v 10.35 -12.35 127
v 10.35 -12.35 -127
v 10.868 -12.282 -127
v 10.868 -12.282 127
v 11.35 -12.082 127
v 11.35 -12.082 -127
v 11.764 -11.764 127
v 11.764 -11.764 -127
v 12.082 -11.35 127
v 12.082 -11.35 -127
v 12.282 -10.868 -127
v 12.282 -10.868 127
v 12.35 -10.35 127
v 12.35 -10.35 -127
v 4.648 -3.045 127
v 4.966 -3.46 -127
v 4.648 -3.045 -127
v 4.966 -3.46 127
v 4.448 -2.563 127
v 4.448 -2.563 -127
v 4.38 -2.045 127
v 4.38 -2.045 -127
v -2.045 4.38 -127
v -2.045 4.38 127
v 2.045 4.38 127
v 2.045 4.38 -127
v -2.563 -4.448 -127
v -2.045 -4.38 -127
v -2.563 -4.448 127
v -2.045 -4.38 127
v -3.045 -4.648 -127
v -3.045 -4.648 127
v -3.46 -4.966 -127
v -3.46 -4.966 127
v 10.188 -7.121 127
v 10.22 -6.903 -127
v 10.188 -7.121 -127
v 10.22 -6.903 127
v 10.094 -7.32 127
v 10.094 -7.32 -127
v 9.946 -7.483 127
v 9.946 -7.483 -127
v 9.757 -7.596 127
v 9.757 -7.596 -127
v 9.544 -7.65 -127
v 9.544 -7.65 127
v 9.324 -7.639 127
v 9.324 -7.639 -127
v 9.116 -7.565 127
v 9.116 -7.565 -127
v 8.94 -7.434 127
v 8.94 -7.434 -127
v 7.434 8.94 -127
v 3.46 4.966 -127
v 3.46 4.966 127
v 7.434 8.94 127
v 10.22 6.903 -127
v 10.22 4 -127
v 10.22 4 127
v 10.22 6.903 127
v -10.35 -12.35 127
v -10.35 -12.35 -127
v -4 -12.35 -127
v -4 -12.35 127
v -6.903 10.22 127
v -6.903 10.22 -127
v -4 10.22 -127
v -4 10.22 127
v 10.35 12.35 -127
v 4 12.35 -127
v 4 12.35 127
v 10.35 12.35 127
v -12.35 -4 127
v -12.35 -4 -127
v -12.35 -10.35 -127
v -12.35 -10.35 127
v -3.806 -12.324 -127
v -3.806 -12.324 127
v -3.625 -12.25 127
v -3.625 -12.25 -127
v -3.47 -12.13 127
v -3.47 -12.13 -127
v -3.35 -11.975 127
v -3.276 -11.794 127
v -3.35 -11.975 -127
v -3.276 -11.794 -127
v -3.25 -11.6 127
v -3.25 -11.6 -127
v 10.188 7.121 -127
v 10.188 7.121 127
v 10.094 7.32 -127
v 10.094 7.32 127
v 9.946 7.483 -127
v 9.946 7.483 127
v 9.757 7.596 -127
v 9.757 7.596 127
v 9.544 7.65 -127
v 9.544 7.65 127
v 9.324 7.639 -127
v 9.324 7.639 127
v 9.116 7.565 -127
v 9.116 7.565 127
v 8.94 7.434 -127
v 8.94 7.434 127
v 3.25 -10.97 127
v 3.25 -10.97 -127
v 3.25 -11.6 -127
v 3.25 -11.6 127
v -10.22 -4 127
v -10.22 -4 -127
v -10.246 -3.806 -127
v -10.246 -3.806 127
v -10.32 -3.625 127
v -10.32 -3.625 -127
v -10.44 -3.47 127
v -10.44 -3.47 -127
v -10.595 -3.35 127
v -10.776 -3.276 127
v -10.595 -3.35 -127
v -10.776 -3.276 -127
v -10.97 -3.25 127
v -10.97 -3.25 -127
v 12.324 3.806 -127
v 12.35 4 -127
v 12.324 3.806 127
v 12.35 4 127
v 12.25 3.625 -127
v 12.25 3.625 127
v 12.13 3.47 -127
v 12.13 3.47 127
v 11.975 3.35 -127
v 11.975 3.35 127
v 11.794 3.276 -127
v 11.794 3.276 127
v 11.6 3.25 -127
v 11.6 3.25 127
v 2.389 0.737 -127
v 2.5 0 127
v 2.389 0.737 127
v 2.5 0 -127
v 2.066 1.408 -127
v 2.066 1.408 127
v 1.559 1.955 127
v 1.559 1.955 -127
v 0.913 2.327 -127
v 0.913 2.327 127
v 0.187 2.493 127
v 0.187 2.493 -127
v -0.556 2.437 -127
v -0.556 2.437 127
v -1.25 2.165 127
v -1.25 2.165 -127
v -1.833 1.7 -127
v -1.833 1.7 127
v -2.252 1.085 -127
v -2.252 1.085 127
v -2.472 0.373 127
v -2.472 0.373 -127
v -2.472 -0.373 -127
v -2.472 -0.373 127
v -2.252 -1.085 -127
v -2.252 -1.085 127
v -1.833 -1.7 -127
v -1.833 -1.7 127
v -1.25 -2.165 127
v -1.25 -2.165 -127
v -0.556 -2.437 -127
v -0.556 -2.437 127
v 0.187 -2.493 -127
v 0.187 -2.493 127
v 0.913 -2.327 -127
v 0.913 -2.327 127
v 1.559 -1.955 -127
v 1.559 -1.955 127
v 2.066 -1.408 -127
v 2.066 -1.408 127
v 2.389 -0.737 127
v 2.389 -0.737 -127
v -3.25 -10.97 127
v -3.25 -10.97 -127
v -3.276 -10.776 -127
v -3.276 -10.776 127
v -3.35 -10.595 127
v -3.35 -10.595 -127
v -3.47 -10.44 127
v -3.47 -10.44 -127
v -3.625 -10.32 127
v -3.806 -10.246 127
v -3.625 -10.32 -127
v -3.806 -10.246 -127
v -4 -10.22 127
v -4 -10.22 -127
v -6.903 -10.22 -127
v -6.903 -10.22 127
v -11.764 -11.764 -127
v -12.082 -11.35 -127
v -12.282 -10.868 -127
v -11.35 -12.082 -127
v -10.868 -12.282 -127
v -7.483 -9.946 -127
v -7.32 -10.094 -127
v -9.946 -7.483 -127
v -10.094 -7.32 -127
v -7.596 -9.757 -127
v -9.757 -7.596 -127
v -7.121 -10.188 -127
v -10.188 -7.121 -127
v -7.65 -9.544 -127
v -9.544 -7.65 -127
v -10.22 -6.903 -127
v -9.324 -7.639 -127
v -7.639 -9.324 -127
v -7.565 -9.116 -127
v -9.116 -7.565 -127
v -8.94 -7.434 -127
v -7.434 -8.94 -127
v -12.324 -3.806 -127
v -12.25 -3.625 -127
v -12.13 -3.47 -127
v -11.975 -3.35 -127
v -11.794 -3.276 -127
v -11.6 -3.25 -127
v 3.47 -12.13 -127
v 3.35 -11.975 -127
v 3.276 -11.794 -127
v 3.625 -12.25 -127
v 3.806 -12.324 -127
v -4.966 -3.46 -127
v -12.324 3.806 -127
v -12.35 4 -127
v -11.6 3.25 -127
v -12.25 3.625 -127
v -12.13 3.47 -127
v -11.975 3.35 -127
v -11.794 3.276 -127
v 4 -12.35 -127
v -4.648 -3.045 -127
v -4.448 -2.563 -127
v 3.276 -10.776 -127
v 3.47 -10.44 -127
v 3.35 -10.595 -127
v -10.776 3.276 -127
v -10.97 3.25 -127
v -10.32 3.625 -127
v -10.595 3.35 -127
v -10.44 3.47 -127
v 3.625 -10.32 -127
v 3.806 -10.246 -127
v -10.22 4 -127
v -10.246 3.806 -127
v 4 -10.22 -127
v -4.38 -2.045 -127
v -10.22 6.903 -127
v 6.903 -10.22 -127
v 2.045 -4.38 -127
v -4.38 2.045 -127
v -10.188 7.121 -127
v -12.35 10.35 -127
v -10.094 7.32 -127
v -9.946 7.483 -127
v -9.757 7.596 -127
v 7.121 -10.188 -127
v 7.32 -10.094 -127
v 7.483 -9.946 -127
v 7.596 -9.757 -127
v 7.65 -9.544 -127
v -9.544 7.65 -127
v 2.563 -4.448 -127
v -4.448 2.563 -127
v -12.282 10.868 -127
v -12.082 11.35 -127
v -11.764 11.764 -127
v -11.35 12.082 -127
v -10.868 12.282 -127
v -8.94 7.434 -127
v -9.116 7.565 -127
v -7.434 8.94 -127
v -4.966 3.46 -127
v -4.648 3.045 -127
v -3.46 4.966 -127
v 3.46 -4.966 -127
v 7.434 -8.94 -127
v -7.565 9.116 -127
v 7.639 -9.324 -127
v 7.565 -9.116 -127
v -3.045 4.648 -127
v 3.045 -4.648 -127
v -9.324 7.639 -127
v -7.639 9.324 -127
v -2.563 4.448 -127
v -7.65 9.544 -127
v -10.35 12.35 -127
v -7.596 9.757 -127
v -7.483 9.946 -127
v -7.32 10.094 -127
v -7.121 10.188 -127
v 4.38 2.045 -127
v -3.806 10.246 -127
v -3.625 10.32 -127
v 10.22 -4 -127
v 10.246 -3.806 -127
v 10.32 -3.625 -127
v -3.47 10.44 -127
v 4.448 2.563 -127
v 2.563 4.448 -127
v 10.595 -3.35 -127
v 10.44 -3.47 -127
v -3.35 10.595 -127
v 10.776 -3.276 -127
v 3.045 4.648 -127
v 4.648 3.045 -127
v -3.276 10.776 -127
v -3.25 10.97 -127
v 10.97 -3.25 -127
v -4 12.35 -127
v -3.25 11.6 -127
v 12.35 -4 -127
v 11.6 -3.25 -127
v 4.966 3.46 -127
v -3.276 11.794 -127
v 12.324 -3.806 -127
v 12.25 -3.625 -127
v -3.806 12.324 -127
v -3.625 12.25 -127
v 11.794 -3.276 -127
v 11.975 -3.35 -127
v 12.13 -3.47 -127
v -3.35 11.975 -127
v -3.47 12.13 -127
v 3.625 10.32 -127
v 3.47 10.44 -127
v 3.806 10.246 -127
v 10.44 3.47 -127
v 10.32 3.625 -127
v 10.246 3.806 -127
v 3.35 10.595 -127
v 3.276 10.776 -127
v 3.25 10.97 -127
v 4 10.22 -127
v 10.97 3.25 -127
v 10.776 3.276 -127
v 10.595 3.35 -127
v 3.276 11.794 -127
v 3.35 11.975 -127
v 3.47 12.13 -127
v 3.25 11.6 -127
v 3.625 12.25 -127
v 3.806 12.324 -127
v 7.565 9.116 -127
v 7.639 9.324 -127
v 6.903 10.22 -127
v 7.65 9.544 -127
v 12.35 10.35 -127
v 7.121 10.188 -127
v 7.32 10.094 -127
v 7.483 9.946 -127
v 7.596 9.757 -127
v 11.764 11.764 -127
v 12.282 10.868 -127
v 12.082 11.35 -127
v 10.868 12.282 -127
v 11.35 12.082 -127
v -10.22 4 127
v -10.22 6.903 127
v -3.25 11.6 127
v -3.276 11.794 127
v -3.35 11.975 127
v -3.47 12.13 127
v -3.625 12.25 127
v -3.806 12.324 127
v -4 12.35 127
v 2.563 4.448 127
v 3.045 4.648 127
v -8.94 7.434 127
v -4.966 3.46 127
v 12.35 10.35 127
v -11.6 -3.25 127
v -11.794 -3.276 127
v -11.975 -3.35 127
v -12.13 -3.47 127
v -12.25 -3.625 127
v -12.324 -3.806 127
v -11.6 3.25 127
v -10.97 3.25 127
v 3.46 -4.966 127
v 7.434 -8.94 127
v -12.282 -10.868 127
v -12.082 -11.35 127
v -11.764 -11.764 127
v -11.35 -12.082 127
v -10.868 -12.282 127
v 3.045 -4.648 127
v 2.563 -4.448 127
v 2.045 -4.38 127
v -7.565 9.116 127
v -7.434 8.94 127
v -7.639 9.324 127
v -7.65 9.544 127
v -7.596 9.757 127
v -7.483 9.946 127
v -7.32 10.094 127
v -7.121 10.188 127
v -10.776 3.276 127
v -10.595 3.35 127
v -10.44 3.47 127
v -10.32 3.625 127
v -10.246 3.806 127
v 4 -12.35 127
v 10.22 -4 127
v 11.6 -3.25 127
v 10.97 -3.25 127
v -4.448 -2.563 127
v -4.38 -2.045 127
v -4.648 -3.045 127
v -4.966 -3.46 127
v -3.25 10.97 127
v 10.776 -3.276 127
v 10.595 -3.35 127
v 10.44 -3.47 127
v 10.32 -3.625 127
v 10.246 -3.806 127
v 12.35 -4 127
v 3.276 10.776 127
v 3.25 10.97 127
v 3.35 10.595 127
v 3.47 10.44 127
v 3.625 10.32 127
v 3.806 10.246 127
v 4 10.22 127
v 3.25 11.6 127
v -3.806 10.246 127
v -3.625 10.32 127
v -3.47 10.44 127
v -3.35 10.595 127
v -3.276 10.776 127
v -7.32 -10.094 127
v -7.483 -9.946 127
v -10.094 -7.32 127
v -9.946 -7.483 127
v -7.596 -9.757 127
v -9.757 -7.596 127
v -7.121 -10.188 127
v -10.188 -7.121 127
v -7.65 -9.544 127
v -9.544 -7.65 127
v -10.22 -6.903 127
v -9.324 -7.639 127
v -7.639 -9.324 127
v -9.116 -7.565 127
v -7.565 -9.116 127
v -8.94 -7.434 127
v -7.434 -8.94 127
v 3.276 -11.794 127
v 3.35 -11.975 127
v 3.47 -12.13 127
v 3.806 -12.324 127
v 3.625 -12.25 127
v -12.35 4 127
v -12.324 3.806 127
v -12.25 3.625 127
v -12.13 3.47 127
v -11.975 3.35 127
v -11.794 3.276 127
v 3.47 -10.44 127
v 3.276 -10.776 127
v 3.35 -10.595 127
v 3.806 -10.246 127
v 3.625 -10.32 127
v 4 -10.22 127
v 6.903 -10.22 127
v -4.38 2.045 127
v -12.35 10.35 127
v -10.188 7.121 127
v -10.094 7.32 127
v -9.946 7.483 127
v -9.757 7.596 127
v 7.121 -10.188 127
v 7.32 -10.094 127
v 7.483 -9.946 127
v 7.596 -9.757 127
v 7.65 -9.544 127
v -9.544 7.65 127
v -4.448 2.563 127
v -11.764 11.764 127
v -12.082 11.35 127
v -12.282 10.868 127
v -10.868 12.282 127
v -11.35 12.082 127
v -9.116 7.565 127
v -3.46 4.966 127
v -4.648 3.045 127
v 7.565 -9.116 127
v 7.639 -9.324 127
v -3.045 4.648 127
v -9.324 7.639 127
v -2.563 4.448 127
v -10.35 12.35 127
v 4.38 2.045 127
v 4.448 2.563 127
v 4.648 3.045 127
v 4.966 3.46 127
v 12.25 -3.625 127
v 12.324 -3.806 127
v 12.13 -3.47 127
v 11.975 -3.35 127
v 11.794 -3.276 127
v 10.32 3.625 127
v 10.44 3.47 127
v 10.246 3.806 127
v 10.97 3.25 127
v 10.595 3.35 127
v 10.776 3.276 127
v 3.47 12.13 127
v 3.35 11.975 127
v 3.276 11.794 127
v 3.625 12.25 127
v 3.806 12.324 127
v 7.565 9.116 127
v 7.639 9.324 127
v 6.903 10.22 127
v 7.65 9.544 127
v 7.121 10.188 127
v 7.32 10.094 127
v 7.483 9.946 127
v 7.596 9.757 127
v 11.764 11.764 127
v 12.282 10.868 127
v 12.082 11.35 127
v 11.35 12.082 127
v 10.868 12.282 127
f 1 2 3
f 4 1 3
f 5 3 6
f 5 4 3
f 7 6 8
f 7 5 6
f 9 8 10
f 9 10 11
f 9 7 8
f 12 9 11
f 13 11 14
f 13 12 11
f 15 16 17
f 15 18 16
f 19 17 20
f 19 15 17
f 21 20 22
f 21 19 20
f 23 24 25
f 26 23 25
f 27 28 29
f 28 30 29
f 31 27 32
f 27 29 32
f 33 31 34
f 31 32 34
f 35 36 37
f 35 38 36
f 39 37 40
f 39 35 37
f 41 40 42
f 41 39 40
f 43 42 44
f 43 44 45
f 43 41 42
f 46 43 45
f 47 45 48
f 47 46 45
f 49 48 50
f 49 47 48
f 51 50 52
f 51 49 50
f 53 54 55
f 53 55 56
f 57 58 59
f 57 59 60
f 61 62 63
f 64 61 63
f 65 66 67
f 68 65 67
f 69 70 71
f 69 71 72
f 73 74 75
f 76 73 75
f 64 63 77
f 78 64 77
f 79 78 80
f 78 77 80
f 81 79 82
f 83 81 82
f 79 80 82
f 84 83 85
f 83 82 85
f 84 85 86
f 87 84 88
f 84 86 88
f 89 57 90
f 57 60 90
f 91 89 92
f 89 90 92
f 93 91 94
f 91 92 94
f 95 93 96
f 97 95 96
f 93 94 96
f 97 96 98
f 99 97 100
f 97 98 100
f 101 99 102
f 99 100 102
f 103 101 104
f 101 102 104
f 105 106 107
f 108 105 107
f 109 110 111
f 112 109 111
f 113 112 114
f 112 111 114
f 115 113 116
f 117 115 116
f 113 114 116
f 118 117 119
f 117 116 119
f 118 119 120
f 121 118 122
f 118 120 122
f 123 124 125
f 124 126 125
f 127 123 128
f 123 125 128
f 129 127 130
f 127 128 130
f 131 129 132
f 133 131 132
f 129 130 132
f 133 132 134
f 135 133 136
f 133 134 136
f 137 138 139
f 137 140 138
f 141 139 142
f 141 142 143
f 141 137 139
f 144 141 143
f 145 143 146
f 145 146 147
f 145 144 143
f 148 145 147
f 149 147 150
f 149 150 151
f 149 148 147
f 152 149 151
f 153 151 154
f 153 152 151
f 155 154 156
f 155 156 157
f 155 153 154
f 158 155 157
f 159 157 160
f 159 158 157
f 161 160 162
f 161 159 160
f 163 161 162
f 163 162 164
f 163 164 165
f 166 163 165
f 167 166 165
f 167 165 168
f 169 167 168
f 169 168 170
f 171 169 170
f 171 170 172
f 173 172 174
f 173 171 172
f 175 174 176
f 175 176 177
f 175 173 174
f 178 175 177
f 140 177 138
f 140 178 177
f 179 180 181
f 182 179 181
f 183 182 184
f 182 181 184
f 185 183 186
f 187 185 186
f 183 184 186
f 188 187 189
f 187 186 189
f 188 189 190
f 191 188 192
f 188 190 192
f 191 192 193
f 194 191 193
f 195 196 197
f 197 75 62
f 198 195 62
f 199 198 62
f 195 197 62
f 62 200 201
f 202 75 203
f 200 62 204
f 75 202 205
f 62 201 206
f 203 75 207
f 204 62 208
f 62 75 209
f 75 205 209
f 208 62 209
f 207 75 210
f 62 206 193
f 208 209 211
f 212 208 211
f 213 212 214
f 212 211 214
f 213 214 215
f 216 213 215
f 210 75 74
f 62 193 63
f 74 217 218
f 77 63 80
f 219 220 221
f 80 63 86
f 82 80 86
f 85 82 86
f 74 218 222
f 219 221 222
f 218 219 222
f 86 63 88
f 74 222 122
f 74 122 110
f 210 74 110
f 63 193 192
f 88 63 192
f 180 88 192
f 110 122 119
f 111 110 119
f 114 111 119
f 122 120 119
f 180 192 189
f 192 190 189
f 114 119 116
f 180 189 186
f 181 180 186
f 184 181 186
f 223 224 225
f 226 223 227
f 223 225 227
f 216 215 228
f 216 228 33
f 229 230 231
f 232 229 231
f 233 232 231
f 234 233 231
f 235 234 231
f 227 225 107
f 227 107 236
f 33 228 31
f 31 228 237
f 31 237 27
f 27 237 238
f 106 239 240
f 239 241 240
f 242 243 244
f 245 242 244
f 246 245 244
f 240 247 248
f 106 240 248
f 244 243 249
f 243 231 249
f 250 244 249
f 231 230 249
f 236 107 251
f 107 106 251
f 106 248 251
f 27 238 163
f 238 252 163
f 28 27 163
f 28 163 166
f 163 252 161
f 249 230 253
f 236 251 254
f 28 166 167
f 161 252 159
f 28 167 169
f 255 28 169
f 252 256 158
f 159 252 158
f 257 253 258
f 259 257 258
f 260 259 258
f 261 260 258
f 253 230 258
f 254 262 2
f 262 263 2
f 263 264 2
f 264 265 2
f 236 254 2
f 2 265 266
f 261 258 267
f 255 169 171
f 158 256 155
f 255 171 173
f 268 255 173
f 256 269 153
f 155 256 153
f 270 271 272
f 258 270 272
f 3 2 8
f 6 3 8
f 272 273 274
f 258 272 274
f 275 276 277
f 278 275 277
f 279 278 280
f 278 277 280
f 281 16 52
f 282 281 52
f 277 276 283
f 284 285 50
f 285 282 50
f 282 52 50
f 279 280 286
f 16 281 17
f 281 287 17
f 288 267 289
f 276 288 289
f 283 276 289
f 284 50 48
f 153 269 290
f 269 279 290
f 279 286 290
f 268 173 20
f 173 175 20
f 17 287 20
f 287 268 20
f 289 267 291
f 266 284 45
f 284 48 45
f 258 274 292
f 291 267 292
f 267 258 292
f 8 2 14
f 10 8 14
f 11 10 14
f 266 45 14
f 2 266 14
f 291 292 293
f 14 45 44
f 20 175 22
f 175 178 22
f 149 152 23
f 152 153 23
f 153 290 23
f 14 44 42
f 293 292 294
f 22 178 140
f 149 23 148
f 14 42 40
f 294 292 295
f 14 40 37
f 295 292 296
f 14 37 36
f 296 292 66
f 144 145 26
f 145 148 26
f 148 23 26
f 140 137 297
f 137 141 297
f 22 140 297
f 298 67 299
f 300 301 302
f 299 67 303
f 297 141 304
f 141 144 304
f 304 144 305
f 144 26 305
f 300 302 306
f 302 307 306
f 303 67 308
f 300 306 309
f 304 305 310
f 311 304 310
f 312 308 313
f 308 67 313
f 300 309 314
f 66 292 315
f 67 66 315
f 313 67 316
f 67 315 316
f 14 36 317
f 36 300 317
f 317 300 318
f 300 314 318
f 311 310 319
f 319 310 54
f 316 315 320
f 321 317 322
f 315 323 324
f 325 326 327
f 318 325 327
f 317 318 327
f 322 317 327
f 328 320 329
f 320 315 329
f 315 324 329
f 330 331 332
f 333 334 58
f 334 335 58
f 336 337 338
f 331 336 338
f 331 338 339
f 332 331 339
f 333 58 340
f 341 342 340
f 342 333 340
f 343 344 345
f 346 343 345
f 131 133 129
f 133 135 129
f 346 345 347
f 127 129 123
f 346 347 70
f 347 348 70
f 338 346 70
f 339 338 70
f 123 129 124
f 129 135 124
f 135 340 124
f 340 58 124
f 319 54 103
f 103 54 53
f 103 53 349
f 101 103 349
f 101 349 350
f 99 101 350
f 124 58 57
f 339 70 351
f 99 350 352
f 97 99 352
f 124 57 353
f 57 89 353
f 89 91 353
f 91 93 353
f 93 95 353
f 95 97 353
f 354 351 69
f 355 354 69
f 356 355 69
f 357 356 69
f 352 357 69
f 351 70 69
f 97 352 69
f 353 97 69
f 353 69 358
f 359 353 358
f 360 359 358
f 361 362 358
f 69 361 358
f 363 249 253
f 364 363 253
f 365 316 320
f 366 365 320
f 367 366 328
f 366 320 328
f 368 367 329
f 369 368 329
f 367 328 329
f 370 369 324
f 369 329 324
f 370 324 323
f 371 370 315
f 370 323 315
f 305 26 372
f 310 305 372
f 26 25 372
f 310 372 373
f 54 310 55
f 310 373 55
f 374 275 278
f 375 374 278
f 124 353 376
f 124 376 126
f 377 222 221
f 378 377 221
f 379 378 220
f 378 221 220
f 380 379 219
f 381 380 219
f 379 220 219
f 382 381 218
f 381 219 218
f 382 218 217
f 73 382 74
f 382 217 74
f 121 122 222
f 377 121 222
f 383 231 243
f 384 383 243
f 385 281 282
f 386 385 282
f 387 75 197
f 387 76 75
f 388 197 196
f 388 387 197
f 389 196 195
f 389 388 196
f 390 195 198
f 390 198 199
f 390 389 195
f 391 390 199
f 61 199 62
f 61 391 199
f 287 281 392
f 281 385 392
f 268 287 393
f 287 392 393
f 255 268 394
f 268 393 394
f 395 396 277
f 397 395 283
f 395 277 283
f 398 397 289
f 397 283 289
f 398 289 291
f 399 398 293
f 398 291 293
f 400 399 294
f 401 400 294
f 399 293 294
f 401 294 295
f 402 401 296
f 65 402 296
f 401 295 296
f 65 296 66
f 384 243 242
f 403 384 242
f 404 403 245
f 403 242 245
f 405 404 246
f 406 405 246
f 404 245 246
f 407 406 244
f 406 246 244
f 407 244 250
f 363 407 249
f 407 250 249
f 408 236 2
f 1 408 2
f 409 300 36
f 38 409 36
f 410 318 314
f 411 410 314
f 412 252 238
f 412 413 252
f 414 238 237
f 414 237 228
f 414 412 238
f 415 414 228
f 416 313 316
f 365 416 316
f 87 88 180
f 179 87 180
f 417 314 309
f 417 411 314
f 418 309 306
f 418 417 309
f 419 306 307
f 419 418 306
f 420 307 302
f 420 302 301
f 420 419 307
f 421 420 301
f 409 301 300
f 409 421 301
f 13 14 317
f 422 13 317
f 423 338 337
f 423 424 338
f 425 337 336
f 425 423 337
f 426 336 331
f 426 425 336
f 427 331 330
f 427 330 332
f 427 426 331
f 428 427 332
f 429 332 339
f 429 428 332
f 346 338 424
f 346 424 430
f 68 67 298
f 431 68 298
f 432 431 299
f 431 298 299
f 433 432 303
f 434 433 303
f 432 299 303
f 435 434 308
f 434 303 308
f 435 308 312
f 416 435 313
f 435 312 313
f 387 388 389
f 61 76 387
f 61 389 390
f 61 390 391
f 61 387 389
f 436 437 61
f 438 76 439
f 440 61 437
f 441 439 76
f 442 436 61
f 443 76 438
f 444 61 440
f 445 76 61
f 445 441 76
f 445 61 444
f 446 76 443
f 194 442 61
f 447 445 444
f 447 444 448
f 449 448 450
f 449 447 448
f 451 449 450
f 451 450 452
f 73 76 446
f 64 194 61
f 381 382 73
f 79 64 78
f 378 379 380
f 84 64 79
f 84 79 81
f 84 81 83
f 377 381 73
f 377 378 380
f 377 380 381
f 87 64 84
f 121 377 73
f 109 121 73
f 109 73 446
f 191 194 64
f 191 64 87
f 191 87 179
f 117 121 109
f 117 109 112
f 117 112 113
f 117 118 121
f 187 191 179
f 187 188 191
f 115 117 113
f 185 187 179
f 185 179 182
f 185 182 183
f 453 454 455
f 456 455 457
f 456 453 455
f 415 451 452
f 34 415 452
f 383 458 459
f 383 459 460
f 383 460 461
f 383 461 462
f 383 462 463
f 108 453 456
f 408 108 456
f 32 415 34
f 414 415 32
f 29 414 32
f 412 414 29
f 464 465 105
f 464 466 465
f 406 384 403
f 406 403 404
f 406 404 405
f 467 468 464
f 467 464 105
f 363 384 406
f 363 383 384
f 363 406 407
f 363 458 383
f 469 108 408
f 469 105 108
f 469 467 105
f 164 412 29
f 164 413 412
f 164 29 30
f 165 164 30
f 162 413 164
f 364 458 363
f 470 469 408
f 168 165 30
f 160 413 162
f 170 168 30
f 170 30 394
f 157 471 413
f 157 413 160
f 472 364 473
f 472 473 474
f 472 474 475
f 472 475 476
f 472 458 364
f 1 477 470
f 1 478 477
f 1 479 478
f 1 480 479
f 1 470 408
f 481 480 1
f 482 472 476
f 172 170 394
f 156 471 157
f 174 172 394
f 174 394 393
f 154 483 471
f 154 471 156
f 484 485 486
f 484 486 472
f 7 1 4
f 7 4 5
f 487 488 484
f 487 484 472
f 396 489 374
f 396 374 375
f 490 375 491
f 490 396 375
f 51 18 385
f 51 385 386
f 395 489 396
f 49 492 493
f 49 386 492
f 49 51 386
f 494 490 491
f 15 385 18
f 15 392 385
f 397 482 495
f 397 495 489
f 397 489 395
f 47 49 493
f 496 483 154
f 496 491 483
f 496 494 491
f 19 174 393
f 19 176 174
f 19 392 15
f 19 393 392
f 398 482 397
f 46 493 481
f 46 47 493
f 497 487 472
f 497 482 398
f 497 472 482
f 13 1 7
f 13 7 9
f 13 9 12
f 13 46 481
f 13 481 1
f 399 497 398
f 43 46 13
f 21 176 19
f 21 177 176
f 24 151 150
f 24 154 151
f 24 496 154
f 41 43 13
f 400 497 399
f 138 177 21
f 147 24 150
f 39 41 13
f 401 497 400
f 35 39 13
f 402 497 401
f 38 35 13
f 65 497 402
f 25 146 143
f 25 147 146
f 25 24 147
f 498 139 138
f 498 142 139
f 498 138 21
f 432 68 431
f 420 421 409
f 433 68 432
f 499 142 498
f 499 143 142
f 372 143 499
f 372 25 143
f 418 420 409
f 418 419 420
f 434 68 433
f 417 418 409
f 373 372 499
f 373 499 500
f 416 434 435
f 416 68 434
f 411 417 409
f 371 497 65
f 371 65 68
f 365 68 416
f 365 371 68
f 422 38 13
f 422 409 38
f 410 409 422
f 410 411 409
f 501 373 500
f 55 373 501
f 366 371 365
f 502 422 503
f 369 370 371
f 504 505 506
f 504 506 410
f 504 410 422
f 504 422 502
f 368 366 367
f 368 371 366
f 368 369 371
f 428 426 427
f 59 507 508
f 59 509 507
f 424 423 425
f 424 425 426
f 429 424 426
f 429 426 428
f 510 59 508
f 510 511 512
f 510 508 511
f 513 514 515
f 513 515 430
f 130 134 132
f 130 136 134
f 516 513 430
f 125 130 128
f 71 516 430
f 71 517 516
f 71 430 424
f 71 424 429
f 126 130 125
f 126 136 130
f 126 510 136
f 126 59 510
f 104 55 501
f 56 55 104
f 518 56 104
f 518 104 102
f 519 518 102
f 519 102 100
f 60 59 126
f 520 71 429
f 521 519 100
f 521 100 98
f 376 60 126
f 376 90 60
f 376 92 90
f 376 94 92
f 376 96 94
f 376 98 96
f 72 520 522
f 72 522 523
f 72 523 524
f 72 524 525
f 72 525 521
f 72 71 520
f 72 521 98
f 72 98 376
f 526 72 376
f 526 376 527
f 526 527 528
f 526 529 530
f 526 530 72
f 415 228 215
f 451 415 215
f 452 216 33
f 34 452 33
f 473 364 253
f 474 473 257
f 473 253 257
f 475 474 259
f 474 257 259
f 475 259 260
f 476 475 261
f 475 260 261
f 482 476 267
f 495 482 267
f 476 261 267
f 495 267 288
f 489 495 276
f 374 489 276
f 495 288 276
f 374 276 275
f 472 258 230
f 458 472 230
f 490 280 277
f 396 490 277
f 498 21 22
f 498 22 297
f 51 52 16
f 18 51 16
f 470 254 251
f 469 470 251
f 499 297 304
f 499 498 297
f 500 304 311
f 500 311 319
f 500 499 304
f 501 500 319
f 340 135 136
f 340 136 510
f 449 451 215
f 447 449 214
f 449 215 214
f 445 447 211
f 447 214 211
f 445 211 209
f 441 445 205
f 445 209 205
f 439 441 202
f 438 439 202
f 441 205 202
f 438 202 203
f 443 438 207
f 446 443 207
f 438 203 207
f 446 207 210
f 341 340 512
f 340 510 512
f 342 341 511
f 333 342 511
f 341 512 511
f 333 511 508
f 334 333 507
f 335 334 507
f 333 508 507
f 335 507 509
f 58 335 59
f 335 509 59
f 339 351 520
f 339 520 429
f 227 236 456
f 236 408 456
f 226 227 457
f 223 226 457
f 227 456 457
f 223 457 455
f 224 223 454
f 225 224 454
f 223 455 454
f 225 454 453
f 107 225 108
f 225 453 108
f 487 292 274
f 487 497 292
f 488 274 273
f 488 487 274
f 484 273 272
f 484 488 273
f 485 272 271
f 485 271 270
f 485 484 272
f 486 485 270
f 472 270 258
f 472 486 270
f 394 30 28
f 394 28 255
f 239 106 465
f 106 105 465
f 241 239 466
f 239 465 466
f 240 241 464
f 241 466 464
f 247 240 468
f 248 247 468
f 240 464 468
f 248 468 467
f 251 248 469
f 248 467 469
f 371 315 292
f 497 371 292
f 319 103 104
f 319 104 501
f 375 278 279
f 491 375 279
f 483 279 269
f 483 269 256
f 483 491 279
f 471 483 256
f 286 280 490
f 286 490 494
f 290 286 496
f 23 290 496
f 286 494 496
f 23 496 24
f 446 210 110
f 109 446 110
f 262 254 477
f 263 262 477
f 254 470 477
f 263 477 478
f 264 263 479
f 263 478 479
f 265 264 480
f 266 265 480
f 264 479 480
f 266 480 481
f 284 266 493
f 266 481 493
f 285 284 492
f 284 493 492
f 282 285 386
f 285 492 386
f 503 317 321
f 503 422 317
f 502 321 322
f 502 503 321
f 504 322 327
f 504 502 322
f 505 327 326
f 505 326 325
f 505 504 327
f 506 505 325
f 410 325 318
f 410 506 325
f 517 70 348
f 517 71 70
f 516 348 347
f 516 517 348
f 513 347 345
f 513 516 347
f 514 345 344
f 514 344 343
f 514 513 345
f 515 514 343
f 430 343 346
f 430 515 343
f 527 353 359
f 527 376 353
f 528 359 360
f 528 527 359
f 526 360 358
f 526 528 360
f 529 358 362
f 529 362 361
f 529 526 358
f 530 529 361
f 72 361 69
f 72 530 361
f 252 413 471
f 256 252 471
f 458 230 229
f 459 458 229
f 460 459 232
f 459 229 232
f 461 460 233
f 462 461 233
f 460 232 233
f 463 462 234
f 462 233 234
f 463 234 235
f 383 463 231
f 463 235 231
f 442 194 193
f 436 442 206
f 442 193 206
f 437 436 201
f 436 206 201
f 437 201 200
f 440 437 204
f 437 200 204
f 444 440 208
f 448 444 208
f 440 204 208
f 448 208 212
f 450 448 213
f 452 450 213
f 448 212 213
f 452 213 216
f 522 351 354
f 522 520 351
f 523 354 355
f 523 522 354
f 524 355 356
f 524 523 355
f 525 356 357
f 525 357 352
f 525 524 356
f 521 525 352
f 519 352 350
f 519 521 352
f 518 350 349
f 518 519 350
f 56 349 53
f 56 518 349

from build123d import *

# Parameters (mm, degrees)
SKETCH2_W            = 8.76
SKETCH2_H            = 8.76
SKETCH2_R            = 2.5
BOSS_EXTRUDE1_DEPTH  = 127
BOSS_EXTRUDE2_START  = -127
BOSS_EXTRUDE2_DEPTH  = 254
FILLET1_R            = 0.75
FILLET1_OF_MIRROR1_R = 0.75
MIRROR2_START        = -127
MIRROR2_DEPTH        = 254
FILLET2_R            = 2


# Read off the part's stored shape, not the designer's step: Mirror2
with BuildPart() as part:
    # Sketch2 → Boss-Extrude1 (new, symmetric)
    with BuildSketch(Plane.XY):
        Rectangle(SKETCH2_W, SKETCH2_H)
        Circle(SKETCH2_R, mode=Mode.SUBTRACT)
    extrude(amount=BOSS_EXTRUDE1_DEPTH, both=True)

    # Sketch3 → Boss-Extrude2 (add)
    with BuildSketch(Plane.XY.offset(BOSS_EXTRUDE2_START)):
        Polygon((3.25, 12.35), (12.35, 12.35), (12.35, 3.25), (10.22, 3.25), (10.22, 8.713862556), (4.38, 2.873862556), (4.38, 4.38), (2.873862556, 4.38), (8.713862556, 10.22), (3.25, 10.22), align=None)
    boss_extrude2 = extrude(amount=BOSS_EXTRUDE2_DEPTH)

    # Fillet1
    fillet1_edges = [part.edges().sort_by_distance(p)[0] for p in [
        (3.25, 12.35, 0),
        (3.25, 10.22, 0),
        (8.713862556, 10.22, 0),
        (10.22, 8.713862556, 0),
        (10.22, 3.25, 0),
        (12.35, 3.25, 0),
    ]]
    fillet(fillet1_edges, radius=FILLET1_R)

    # Mirror1: Boss-Extrude2 across plane
    add(boss_extrude2.mirror(Plane.ZX))

    # Fillet1 of Mirror1
    fillet1_of_mirror1_edges = [part.edges().sort_by_distance(p)[0] for p in [
        (3.25, -12.35, 0),
        (3.25, -10.22, 0),
        (8.713862556, -10.22, 0),
        (10.22, -8.713862556, 0),
        (10.22, -3.25, 0),
        (12.35, -3.25, 0),
    ]]
    fillet(fillet1_of_mirror1_edges, radius=FILLET1_OF_MIRROR1_R)

    # Mirror2 outline → Mirror2 (add)
    with BuildSketch(Plane.XY.offset(MIRROR2_START)):
        with BuildLine():
            ThreePointArc((-7.43353247, 8.939669914), (-7.596112034, 9.757012574), (-6.903202384, 10.22))
            Line((-6.903202384, 10.22), (-4, 10.22))
            ThreePointArc((-4, 10.22), (-3.469669914, 10.439669914), (-3.25, 10.97))
            Line((-3.25, 10.97), (-3.25, 11.6))
            ThreePointArc((-3.25, 11.6), (-3.469669914, 12.130330086), (-4, 12.35))
            Line((-4, 12.35), (-12.35, 12.35))
            Line((-12.35, 12.35), (-12.35, 4))
            ThreePointArc((-12.35, 4), (-12.130330086, 3.469669914), (-11.6, 3.25))
            Line((-11.6, 3.25), (-10.97, 3.25))
            ThreePointArc((-10.97, 3.25), (-10.439669914, 3.469669914), (-10.22, 4))
            Line((-10.22, 4), (-10.22, 6.903202384))
            ThreePointArc((-10.22, 6.903202384), (-9.757012574, 7.596112034), (-8.939669914, 7.43353247))
            Line((-8.939669914, 7.43353247), (-4.38, 2.873862556))
            Line((-4.38, 2.873862556), (-4.38, 4.38))
            Line((-4.38, 4.38), (-2.873862556, 4.38))
            Line((-2.873862556, 4.38), (-7.43353247, 8.939669914))
        make_face()
        with BuildLine():
            Line((-4.38, -4.38), (-4.38, -2.873862556))
            Line((-4.38, -2.873862556), (-8.939669914, -7.43353247))
            ThreePointArc((-8.939669914, -7.43353247), (-9.757012574, -7.596112034), (-10.22, -6.903202384))
            Line((-10.22, -6.903202384), (-10.22, -4))
            ThreePointArc((-10.22, -4), (-10.439669914, -3.469669914), (-10.97, -3.25))
            Line((-10.97, -3.25), (-11.6, -3.25))
            ThreePointArc((-11.6, -3.25), (-12.130330086, -3.469669914), (-12.35, -4))
            Line((-12.35, -4), (-12.35, -12.35))
            Line((-12.35, -12.35), (-4, -12.35))
            ThreePointArc((-4, -12.35), (-3.469669914, -12.130330086), (-3.25, -11.6))
            Line((-3.25, -11.6), (-3.25, -10.97))
            ThreePointArc((-3.25, -10.97), (-3.469669914, -10.439669914), (-4, -10.22))
            Line((-4, -10.22), (-6.903202384, -10.22))
            ThreePointArc((-6.903202384, -10.22), (-7.596112034, -9.757012574), (-7.43353247, -8.939669914))
            Line((-7.43353247, -8.939669914), (-2.873862556, -4.38))
            Line((-2.873862556, -4.38), (-4.38, -4.38))
        make_face()
    extrude(amount=MIRROR2_DEPTH)

    # Fillet2
    fillet2_edges = [part.edges().sort_by_distance(p)[0] for p in [
        (-2.873862556, -4.38, 0),
        (-4.38, -2.873862556, 0),
        (-12.35, -12.35, 0),
        (2.873862556, 4.38, 0),
        (4.38, 2.873862556, 0),
        (12.35, 12.35, 0),
        (-2.873862556, 4.38, 0),
        (-4.38, 2.873862556, 0),
        (-12.35, 12.35, 0),
        (2.873862556, -4.38, 0),
        (4.38, -2.873862556, 0),
        (12.35, -12.35, 0),
    ]]
    fillet(fillet2_edges, radius=FILLET2_R)


solid = part.part
